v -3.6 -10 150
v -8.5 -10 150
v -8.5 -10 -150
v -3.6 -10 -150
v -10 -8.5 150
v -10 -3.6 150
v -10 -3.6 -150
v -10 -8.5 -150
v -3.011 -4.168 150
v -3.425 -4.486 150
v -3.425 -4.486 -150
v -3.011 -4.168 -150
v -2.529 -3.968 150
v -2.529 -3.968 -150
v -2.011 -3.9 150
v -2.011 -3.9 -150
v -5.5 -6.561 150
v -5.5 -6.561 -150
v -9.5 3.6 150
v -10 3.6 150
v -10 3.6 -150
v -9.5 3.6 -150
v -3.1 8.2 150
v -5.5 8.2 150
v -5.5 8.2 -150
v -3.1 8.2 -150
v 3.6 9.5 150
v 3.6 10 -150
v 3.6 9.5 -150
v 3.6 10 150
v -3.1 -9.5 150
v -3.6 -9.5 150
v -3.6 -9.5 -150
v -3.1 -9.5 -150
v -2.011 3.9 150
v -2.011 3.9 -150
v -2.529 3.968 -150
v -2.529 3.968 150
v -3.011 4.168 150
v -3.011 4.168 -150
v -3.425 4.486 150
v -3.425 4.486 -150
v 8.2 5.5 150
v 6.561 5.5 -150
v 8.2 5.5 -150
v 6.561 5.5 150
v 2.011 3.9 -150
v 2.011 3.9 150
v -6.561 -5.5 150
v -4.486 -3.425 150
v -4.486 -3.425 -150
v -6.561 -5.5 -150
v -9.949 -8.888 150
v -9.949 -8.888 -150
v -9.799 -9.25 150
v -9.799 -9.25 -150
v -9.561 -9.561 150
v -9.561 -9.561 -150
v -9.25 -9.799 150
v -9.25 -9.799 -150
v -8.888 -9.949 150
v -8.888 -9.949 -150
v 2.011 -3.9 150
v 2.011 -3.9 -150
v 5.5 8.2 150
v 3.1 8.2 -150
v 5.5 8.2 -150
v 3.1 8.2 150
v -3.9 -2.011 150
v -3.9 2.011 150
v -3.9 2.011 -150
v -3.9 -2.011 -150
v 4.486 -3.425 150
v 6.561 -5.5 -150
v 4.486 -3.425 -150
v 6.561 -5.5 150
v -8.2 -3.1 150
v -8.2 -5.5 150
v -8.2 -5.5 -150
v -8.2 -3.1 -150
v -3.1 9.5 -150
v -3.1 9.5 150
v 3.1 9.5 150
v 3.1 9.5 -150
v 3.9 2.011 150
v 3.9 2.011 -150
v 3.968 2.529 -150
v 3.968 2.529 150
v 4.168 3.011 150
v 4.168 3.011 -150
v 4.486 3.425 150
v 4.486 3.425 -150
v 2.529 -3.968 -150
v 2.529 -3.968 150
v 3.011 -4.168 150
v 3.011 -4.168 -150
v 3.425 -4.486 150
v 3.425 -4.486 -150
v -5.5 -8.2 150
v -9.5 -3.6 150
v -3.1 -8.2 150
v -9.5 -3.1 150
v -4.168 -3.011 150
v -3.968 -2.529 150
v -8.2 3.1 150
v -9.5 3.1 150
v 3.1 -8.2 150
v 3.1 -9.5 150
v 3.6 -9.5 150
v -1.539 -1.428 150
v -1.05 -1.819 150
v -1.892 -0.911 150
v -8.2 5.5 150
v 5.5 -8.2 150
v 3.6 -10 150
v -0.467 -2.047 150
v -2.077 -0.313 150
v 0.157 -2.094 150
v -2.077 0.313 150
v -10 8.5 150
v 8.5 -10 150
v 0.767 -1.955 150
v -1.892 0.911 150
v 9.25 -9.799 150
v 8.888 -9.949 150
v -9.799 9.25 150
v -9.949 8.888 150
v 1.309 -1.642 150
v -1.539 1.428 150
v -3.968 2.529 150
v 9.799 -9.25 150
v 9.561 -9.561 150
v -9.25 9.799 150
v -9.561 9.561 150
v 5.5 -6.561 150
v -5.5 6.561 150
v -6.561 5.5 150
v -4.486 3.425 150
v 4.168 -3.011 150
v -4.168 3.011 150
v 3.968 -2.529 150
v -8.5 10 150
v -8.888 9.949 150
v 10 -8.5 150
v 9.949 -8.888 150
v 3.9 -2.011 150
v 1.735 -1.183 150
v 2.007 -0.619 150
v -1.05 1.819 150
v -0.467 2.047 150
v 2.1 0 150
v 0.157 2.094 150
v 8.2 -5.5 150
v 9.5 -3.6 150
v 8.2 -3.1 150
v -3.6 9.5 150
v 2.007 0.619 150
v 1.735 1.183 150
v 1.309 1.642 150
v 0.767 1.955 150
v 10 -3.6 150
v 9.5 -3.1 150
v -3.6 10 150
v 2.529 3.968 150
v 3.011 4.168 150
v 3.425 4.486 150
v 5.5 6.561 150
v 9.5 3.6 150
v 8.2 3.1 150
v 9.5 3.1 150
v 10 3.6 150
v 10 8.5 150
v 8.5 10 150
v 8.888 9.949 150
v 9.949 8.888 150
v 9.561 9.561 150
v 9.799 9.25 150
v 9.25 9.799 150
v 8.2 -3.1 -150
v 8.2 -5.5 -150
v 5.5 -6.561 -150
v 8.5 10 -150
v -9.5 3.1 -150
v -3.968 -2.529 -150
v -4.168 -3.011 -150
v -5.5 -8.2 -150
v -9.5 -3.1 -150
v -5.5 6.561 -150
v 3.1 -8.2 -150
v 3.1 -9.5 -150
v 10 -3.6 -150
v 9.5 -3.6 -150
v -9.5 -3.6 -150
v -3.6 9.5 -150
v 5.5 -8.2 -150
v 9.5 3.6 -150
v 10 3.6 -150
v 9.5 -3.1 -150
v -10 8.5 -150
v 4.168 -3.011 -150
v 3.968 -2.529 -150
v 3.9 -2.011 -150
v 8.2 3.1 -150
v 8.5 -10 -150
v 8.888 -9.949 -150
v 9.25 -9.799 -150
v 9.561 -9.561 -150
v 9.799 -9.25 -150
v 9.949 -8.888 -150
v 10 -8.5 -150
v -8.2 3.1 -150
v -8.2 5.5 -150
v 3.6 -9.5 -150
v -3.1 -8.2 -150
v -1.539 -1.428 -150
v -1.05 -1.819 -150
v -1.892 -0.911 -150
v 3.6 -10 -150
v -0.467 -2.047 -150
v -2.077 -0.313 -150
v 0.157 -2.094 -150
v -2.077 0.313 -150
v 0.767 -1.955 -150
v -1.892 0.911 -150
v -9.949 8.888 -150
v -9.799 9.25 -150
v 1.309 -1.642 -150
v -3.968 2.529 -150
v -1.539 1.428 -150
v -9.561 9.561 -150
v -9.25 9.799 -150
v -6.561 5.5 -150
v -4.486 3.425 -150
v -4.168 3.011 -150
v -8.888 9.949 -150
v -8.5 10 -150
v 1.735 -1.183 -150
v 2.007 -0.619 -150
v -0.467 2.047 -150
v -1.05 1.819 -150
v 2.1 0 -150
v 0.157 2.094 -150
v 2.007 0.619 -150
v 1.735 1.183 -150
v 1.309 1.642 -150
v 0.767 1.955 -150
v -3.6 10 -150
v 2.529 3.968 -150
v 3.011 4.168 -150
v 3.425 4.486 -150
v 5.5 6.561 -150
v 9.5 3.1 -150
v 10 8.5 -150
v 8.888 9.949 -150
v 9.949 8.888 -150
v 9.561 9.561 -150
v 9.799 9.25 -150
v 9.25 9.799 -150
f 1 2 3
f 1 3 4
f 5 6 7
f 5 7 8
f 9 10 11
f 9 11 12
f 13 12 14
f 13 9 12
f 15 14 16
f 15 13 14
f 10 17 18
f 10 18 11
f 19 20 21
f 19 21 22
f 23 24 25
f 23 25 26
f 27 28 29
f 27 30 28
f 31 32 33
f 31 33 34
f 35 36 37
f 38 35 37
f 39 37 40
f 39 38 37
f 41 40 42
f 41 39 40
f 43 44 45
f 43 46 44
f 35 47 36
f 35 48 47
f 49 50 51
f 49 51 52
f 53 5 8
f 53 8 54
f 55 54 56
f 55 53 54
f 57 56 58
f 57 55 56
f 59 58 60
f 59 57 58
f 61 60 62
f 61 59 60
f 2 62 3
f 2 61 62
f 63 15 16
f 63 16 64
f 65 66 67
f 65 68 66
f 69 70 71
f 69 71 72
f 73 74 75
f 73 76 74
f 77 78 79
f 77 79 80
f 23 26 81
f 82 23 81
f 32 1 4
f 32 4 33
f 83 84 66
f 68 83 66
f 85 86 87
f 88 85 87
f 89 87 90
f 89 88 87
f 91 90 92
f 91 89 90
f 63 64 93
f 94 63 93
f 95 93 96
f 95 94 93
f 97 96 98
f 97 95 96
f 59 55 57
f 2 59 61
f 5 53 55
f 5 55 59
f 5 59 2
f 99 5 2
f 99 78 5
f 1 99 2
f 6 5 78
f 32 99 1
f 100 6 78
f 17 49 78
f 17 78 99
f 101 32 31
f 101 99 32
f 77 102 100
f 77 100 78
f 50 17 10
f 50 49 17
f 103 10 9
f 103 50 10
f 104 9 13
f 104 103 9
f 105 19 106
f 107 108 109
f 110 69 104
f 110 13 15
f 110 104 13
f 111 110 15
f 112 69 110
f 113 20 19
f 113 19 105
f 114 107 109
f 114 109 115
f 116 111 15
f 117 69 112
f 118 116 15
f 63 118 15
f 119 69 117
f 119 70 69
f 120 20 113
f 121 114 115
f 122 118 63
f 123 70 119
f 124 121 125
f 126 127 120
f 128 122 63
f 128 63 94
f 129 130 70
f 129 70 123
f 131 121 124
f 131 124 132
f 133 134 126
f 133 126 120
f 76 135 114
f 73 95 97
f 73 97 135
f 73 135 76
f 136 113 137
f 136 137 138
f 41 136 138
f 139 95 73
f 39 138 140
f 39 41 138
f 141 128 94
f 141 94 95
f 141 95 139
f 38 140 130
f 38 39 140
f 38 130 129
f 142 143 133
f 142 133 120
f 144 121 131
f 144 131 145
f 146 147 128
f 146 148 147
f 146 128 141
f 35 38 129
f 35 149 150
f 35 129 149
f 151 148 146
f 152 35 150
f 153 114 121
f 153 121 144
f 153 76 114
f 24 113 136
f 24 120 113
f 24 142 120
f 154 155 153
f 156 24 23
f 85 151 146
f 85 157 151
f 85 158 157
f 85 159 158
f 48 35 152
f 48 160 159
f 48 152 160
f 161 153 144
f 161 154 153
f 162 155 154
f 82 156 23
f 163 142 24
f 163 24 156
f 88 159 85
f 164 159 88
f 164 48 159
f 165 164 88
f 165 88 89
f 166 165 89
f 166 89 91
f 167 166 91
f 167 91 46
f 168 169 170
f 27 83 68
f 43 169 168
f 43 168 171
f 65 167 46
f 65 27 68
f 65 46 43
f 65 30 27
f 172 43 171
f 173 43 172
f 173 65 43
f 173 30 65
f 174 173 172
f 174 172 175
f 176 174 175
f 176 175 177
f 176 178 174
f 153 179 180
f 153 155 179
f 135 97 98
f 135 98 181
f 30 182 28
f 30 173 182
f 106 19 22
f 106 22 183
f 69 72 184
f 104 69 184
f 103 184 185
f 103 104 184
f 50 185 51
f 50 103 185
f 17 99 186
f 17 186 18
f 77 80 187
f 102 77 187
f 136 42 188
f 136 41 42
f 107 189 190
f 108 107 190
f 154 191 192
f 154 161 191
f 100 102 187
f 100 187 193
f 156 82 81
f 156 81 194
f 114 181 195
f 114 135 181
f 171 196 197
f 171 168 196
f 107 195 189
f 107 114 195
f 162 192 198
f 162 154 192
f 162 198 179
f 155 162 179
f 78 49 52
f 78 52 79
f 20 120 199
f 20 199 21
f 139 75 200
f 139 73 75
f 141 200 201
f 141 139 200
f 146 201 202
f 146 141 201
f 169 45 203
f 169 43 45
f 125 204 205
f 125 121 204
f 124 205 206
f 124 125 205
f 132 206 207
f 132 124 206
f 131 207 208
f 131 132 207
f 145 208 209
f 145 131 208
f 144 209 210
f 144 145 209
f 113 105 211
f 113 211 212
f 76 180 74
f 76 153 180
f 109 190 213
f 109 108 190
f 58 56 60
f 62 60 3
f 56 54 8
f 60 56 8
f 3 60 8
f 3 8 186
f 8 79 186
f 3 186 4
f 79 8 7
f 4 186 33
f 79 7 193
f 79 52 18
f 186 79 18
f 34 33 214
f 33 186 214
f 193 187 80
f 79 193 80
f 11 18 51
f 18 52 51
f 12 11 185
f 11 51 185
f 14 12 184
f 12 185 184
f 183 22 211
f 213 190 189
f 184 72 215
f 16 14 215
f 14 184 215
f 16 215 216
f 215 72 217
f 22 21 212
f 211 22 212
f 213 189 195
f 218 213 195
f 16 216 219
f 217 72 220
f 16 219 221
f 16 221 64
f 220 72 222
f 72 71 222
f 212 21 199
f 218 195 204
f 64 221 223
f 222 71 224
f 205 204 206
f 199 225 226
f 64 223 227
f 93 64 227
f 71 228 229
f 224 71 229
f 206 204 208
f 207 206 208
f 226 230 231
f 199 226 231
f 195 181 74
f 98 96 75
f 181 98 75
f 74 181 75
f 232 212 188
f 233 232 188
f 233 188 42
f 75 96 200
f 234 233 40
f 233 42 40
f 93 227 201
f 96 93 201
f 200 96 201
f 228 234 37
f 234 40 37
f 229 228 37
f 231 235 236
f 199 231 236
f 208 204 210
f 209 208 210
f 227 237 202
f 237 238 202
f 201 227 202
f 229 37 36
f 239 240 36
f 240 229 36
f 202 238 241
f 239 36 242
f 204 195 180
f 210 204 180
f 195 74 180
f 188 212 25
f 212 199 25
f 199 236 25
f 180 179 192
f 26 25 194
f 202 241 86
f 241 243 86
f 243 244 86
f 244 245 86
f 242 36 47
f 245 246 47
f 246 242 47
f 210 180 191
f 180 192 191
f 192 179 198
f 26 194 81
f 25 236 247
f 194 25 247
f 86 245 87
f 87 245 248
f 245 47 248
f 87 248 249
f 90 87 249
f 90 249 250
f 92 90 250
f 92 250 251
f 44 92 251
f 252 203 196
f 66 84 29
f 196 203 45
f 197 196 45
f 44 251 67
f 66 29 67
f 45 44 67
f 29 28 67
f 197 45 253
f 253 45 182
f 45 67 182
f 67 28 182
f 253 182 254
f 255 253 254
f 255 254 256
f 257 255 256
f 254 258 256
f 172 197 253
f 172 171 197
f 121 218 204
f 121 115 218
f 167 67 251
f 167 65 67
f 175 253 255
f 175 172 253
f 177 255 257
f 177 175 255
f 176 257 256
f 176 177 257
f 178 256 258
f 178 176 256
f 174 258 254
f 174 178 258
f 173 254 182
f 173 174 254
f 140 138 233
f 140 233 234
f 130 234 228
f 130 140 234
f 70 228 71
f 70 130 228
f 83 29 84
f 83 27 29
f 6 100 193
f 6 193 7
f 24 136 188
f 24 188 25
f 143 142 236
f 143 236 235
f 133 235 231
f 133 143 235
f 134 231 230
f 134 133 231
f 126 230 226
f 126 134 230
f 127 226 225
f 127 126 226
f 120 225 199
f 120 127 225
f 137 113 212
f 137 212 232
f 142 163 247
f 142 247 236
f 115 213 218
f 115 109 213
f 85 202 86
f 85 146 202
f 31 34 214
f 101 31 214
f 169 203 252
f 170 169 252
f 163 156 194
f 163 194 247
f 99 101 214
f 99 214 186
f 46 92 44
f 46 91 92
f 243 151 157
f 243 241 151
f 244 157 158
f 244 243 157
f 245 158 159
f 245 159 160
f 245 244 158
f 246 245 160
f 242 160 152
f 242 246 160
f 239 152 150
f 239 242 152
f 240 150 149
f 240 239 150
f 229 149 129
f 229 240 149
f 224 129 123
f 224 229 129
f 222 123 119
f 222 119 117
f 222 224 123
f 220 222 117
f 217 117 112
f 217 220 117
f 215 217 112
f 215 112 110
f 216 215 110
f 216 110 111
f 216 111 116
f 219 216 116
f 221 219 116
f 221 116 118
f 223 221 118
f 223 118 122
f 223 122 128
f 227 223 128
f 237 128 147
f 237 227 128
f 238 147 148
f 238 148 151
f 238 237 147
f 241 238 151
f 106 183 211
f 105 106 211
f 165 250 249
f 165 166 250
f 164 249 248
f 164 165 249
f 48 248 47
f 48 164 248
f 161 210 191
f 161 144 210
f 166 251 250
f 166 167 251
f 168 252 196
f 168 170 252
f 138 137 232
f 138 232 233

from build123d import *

# Parameters (mm, degrees)
SKETCH_1_R      = 2.1
EXTRUDE_1_DEPTH = 150


with BuildPart() as part:
    # 草图1 → 凸台-拉伸1 (new body, symmetric)
    with BuildSketch(Plane.XY):
        with BuildLine():
            Line((-3.425126266, 4.485786438), (-5.5, 6.560660172))
            Line((-5.5, 6.560660172), (-5.5, 8.2))
            Line((-5.5, 8.2), (-3.1, 8.2))
            Line((-3.1, 8.2), (-3.1, 9.5))
            Line((-3.1, 9.5), (-3.6, 9.5))
            Line((-3.6, 9.5), (-3.6, 10))
            Line((-3.6, 10), (-8.5, 10))
            ThreePointArc((-8.5, 10), (-9.560660172, 9.560660172), (-10, 8.5))
            Line((-10, 8.5), (-10, 3.6))
            Line((-10, 3.6), (-9.5, 3.6))
            Line((-9.5, 3.6), (-9.5, 3.1))
            Line((-9.5, 3.1), (-8.2, 3.1))
            Line((-8.2, 3.1), (-8.2, 5.5))
            Line((-8.2, 5.5), (-6.560660172, 5.5))
            Line((-6.560660172, 5.5), (-4.485786438, 3.425126266))
            ThreePointArc((-4.485786438, 3.425126266), (-4.052240935, 2.776279568), (-3.9, 2.010912703))
            Line((-3.9, 2.010912703), (-3.9, -2.010912703))
            ThreePointArc((-3.9, -2.010912703), (-4.052240935, -2.776279568), (-4.485786438, -3.425126266))
            Line((-4.485786438, -3.425126266), (-6.560660172, -5.5))
            Line((-6.560660172, -5.5), (-8.2, -5.5))
            Line((-8.2, -5.5), (-8.2, -3.1))
            Line((-8.2, -3.1), (-9.5, -3.1))
            Line((-9.5, -3.1), (-9.5, -3.6))
            Line((-9.5, -3.6), (-10, -3.6))
            Line((-10, -3.6), (-10, -8.5))
            ThreePointArc((-10, -8.5), (-9.560660172, -9.560660172), (-8.5, -10))
            Line((-8.5, -10), (-3.6, -10))
            Line((-3.6, -10), (-3.6, -9.5))
            Line((-3.6, -9.5), (-3.1, -9.5))
            Line((-3.1, -9.5), (-3.1, -8.2))
            Line((-3.1, -8.2), (-5.5, -8.2))
            Line((-5.5, -8.2), (-5.5, -6.560660172))
            Line((-5.5, -6.560660172), (-3.425126266, -4.485786438))
            ThreePointArc((-3.425126266, -4.485786438), (-2.776279568, -4.052240935), (-2.010912703, -3.9))
            Line((-2.010912703, -3.9), (2.010912703, -3.9))
            ThreePointArc((2.010912703, -3.9), (2.776279568, -4.052240935), (3.425126266, -4.485786438))
            Line((3.425126266, -4.485786438), (5.5, -6.560660172))
            Line((5.5, -6.560660172), (5.5, -8.2))
            Line((5.5, -8.2), (3.1, -8.2))
            Line((3.1, -8.2), (3.1, -9.5))
            Line((3.1, -9.5), (3.6, -9.5))
            Line((3.6, -9.5), (3.6, -10))
            Line((3.6, -10), (8.5, -10))
            ThreePointArc((8.5, -10), (9.560660172, -9.560660172), (10, -8.5))
            Line((10, -8.5), (10, -3.6))
            Line((10, -3.6), (9.5, -3.6))
            Line((9.5, -3.6), (9.5, -3.1))
            Line((9.5, -3.1), (8.2, -3.1))
            Line((8.2, -3.1), (8.2, -5.5))
            Line((8.2, -5.5), (6.560660172, -5.5))
            Line((6.560660172, -5.5), (4.485786438, -3.425126266))
            ThreePointArc((4.485786438, -3.425126266), (4.052240935, -2.776279568), (3.9, -2.010912703))
            Line((3.9, -2.010912703), (3.9, 2.010912703))
            ThreePointArc((3.9, 2.010912703), (4.052240935, 2.776279568), (4.485786438, 3.425126266))
            Line((4.485786438, 3.425126266), (6.560660172, 5.5))
            Line((6.560660172, 5.5), (8.2, 5.5))
            Line((8.2, 5.5), (8.2, 3.1))
            Line((8.2, 3.1), (9.5, 3.1))
            Line((9.5, 3.1), (9.5, 3.6))
            Line((9.5, 3.6), (10, 3.6))
            Line((10, 3.6), (10, 8.5))
            ThreePointArc((10, 8.5), (9.560660172, 9.560660172), (8.5, 10))
            Line((8.5, 10), (3.6, 10))
            Line((3.6, 10), (3.6, 9.5))
            Line((3.6, 9.5), (3.1, 9.5))
            Line((3.1, 9.5), (3.1, 8.2))
            Line((3.1, 8.2), (5.5, 8.2))
            Line((5.5, 8.2), (5.5, 6.560660172))
            Line((5.5, 6.560660172), (3.425126266, 4.485786438))
            ThreePointArc((3.425126266, 4.485786438), (2.776279568, 4.052240935), (2.010912703, 3.9))
            Line((2.010912703, 3.9), (-2.010912703, 3.9))
            ThreePointArc((-2.010912703, 3.9), (-2.776279568, 4.052240935), (-3.425126266, 4.485786438))
        make_face()
        Circle(SKETCH_1_R, mode=Mode.SUBTRACT)
    extrude(amount=EXTRUDE_1_DEPTH, both=True)


solid = part.part
